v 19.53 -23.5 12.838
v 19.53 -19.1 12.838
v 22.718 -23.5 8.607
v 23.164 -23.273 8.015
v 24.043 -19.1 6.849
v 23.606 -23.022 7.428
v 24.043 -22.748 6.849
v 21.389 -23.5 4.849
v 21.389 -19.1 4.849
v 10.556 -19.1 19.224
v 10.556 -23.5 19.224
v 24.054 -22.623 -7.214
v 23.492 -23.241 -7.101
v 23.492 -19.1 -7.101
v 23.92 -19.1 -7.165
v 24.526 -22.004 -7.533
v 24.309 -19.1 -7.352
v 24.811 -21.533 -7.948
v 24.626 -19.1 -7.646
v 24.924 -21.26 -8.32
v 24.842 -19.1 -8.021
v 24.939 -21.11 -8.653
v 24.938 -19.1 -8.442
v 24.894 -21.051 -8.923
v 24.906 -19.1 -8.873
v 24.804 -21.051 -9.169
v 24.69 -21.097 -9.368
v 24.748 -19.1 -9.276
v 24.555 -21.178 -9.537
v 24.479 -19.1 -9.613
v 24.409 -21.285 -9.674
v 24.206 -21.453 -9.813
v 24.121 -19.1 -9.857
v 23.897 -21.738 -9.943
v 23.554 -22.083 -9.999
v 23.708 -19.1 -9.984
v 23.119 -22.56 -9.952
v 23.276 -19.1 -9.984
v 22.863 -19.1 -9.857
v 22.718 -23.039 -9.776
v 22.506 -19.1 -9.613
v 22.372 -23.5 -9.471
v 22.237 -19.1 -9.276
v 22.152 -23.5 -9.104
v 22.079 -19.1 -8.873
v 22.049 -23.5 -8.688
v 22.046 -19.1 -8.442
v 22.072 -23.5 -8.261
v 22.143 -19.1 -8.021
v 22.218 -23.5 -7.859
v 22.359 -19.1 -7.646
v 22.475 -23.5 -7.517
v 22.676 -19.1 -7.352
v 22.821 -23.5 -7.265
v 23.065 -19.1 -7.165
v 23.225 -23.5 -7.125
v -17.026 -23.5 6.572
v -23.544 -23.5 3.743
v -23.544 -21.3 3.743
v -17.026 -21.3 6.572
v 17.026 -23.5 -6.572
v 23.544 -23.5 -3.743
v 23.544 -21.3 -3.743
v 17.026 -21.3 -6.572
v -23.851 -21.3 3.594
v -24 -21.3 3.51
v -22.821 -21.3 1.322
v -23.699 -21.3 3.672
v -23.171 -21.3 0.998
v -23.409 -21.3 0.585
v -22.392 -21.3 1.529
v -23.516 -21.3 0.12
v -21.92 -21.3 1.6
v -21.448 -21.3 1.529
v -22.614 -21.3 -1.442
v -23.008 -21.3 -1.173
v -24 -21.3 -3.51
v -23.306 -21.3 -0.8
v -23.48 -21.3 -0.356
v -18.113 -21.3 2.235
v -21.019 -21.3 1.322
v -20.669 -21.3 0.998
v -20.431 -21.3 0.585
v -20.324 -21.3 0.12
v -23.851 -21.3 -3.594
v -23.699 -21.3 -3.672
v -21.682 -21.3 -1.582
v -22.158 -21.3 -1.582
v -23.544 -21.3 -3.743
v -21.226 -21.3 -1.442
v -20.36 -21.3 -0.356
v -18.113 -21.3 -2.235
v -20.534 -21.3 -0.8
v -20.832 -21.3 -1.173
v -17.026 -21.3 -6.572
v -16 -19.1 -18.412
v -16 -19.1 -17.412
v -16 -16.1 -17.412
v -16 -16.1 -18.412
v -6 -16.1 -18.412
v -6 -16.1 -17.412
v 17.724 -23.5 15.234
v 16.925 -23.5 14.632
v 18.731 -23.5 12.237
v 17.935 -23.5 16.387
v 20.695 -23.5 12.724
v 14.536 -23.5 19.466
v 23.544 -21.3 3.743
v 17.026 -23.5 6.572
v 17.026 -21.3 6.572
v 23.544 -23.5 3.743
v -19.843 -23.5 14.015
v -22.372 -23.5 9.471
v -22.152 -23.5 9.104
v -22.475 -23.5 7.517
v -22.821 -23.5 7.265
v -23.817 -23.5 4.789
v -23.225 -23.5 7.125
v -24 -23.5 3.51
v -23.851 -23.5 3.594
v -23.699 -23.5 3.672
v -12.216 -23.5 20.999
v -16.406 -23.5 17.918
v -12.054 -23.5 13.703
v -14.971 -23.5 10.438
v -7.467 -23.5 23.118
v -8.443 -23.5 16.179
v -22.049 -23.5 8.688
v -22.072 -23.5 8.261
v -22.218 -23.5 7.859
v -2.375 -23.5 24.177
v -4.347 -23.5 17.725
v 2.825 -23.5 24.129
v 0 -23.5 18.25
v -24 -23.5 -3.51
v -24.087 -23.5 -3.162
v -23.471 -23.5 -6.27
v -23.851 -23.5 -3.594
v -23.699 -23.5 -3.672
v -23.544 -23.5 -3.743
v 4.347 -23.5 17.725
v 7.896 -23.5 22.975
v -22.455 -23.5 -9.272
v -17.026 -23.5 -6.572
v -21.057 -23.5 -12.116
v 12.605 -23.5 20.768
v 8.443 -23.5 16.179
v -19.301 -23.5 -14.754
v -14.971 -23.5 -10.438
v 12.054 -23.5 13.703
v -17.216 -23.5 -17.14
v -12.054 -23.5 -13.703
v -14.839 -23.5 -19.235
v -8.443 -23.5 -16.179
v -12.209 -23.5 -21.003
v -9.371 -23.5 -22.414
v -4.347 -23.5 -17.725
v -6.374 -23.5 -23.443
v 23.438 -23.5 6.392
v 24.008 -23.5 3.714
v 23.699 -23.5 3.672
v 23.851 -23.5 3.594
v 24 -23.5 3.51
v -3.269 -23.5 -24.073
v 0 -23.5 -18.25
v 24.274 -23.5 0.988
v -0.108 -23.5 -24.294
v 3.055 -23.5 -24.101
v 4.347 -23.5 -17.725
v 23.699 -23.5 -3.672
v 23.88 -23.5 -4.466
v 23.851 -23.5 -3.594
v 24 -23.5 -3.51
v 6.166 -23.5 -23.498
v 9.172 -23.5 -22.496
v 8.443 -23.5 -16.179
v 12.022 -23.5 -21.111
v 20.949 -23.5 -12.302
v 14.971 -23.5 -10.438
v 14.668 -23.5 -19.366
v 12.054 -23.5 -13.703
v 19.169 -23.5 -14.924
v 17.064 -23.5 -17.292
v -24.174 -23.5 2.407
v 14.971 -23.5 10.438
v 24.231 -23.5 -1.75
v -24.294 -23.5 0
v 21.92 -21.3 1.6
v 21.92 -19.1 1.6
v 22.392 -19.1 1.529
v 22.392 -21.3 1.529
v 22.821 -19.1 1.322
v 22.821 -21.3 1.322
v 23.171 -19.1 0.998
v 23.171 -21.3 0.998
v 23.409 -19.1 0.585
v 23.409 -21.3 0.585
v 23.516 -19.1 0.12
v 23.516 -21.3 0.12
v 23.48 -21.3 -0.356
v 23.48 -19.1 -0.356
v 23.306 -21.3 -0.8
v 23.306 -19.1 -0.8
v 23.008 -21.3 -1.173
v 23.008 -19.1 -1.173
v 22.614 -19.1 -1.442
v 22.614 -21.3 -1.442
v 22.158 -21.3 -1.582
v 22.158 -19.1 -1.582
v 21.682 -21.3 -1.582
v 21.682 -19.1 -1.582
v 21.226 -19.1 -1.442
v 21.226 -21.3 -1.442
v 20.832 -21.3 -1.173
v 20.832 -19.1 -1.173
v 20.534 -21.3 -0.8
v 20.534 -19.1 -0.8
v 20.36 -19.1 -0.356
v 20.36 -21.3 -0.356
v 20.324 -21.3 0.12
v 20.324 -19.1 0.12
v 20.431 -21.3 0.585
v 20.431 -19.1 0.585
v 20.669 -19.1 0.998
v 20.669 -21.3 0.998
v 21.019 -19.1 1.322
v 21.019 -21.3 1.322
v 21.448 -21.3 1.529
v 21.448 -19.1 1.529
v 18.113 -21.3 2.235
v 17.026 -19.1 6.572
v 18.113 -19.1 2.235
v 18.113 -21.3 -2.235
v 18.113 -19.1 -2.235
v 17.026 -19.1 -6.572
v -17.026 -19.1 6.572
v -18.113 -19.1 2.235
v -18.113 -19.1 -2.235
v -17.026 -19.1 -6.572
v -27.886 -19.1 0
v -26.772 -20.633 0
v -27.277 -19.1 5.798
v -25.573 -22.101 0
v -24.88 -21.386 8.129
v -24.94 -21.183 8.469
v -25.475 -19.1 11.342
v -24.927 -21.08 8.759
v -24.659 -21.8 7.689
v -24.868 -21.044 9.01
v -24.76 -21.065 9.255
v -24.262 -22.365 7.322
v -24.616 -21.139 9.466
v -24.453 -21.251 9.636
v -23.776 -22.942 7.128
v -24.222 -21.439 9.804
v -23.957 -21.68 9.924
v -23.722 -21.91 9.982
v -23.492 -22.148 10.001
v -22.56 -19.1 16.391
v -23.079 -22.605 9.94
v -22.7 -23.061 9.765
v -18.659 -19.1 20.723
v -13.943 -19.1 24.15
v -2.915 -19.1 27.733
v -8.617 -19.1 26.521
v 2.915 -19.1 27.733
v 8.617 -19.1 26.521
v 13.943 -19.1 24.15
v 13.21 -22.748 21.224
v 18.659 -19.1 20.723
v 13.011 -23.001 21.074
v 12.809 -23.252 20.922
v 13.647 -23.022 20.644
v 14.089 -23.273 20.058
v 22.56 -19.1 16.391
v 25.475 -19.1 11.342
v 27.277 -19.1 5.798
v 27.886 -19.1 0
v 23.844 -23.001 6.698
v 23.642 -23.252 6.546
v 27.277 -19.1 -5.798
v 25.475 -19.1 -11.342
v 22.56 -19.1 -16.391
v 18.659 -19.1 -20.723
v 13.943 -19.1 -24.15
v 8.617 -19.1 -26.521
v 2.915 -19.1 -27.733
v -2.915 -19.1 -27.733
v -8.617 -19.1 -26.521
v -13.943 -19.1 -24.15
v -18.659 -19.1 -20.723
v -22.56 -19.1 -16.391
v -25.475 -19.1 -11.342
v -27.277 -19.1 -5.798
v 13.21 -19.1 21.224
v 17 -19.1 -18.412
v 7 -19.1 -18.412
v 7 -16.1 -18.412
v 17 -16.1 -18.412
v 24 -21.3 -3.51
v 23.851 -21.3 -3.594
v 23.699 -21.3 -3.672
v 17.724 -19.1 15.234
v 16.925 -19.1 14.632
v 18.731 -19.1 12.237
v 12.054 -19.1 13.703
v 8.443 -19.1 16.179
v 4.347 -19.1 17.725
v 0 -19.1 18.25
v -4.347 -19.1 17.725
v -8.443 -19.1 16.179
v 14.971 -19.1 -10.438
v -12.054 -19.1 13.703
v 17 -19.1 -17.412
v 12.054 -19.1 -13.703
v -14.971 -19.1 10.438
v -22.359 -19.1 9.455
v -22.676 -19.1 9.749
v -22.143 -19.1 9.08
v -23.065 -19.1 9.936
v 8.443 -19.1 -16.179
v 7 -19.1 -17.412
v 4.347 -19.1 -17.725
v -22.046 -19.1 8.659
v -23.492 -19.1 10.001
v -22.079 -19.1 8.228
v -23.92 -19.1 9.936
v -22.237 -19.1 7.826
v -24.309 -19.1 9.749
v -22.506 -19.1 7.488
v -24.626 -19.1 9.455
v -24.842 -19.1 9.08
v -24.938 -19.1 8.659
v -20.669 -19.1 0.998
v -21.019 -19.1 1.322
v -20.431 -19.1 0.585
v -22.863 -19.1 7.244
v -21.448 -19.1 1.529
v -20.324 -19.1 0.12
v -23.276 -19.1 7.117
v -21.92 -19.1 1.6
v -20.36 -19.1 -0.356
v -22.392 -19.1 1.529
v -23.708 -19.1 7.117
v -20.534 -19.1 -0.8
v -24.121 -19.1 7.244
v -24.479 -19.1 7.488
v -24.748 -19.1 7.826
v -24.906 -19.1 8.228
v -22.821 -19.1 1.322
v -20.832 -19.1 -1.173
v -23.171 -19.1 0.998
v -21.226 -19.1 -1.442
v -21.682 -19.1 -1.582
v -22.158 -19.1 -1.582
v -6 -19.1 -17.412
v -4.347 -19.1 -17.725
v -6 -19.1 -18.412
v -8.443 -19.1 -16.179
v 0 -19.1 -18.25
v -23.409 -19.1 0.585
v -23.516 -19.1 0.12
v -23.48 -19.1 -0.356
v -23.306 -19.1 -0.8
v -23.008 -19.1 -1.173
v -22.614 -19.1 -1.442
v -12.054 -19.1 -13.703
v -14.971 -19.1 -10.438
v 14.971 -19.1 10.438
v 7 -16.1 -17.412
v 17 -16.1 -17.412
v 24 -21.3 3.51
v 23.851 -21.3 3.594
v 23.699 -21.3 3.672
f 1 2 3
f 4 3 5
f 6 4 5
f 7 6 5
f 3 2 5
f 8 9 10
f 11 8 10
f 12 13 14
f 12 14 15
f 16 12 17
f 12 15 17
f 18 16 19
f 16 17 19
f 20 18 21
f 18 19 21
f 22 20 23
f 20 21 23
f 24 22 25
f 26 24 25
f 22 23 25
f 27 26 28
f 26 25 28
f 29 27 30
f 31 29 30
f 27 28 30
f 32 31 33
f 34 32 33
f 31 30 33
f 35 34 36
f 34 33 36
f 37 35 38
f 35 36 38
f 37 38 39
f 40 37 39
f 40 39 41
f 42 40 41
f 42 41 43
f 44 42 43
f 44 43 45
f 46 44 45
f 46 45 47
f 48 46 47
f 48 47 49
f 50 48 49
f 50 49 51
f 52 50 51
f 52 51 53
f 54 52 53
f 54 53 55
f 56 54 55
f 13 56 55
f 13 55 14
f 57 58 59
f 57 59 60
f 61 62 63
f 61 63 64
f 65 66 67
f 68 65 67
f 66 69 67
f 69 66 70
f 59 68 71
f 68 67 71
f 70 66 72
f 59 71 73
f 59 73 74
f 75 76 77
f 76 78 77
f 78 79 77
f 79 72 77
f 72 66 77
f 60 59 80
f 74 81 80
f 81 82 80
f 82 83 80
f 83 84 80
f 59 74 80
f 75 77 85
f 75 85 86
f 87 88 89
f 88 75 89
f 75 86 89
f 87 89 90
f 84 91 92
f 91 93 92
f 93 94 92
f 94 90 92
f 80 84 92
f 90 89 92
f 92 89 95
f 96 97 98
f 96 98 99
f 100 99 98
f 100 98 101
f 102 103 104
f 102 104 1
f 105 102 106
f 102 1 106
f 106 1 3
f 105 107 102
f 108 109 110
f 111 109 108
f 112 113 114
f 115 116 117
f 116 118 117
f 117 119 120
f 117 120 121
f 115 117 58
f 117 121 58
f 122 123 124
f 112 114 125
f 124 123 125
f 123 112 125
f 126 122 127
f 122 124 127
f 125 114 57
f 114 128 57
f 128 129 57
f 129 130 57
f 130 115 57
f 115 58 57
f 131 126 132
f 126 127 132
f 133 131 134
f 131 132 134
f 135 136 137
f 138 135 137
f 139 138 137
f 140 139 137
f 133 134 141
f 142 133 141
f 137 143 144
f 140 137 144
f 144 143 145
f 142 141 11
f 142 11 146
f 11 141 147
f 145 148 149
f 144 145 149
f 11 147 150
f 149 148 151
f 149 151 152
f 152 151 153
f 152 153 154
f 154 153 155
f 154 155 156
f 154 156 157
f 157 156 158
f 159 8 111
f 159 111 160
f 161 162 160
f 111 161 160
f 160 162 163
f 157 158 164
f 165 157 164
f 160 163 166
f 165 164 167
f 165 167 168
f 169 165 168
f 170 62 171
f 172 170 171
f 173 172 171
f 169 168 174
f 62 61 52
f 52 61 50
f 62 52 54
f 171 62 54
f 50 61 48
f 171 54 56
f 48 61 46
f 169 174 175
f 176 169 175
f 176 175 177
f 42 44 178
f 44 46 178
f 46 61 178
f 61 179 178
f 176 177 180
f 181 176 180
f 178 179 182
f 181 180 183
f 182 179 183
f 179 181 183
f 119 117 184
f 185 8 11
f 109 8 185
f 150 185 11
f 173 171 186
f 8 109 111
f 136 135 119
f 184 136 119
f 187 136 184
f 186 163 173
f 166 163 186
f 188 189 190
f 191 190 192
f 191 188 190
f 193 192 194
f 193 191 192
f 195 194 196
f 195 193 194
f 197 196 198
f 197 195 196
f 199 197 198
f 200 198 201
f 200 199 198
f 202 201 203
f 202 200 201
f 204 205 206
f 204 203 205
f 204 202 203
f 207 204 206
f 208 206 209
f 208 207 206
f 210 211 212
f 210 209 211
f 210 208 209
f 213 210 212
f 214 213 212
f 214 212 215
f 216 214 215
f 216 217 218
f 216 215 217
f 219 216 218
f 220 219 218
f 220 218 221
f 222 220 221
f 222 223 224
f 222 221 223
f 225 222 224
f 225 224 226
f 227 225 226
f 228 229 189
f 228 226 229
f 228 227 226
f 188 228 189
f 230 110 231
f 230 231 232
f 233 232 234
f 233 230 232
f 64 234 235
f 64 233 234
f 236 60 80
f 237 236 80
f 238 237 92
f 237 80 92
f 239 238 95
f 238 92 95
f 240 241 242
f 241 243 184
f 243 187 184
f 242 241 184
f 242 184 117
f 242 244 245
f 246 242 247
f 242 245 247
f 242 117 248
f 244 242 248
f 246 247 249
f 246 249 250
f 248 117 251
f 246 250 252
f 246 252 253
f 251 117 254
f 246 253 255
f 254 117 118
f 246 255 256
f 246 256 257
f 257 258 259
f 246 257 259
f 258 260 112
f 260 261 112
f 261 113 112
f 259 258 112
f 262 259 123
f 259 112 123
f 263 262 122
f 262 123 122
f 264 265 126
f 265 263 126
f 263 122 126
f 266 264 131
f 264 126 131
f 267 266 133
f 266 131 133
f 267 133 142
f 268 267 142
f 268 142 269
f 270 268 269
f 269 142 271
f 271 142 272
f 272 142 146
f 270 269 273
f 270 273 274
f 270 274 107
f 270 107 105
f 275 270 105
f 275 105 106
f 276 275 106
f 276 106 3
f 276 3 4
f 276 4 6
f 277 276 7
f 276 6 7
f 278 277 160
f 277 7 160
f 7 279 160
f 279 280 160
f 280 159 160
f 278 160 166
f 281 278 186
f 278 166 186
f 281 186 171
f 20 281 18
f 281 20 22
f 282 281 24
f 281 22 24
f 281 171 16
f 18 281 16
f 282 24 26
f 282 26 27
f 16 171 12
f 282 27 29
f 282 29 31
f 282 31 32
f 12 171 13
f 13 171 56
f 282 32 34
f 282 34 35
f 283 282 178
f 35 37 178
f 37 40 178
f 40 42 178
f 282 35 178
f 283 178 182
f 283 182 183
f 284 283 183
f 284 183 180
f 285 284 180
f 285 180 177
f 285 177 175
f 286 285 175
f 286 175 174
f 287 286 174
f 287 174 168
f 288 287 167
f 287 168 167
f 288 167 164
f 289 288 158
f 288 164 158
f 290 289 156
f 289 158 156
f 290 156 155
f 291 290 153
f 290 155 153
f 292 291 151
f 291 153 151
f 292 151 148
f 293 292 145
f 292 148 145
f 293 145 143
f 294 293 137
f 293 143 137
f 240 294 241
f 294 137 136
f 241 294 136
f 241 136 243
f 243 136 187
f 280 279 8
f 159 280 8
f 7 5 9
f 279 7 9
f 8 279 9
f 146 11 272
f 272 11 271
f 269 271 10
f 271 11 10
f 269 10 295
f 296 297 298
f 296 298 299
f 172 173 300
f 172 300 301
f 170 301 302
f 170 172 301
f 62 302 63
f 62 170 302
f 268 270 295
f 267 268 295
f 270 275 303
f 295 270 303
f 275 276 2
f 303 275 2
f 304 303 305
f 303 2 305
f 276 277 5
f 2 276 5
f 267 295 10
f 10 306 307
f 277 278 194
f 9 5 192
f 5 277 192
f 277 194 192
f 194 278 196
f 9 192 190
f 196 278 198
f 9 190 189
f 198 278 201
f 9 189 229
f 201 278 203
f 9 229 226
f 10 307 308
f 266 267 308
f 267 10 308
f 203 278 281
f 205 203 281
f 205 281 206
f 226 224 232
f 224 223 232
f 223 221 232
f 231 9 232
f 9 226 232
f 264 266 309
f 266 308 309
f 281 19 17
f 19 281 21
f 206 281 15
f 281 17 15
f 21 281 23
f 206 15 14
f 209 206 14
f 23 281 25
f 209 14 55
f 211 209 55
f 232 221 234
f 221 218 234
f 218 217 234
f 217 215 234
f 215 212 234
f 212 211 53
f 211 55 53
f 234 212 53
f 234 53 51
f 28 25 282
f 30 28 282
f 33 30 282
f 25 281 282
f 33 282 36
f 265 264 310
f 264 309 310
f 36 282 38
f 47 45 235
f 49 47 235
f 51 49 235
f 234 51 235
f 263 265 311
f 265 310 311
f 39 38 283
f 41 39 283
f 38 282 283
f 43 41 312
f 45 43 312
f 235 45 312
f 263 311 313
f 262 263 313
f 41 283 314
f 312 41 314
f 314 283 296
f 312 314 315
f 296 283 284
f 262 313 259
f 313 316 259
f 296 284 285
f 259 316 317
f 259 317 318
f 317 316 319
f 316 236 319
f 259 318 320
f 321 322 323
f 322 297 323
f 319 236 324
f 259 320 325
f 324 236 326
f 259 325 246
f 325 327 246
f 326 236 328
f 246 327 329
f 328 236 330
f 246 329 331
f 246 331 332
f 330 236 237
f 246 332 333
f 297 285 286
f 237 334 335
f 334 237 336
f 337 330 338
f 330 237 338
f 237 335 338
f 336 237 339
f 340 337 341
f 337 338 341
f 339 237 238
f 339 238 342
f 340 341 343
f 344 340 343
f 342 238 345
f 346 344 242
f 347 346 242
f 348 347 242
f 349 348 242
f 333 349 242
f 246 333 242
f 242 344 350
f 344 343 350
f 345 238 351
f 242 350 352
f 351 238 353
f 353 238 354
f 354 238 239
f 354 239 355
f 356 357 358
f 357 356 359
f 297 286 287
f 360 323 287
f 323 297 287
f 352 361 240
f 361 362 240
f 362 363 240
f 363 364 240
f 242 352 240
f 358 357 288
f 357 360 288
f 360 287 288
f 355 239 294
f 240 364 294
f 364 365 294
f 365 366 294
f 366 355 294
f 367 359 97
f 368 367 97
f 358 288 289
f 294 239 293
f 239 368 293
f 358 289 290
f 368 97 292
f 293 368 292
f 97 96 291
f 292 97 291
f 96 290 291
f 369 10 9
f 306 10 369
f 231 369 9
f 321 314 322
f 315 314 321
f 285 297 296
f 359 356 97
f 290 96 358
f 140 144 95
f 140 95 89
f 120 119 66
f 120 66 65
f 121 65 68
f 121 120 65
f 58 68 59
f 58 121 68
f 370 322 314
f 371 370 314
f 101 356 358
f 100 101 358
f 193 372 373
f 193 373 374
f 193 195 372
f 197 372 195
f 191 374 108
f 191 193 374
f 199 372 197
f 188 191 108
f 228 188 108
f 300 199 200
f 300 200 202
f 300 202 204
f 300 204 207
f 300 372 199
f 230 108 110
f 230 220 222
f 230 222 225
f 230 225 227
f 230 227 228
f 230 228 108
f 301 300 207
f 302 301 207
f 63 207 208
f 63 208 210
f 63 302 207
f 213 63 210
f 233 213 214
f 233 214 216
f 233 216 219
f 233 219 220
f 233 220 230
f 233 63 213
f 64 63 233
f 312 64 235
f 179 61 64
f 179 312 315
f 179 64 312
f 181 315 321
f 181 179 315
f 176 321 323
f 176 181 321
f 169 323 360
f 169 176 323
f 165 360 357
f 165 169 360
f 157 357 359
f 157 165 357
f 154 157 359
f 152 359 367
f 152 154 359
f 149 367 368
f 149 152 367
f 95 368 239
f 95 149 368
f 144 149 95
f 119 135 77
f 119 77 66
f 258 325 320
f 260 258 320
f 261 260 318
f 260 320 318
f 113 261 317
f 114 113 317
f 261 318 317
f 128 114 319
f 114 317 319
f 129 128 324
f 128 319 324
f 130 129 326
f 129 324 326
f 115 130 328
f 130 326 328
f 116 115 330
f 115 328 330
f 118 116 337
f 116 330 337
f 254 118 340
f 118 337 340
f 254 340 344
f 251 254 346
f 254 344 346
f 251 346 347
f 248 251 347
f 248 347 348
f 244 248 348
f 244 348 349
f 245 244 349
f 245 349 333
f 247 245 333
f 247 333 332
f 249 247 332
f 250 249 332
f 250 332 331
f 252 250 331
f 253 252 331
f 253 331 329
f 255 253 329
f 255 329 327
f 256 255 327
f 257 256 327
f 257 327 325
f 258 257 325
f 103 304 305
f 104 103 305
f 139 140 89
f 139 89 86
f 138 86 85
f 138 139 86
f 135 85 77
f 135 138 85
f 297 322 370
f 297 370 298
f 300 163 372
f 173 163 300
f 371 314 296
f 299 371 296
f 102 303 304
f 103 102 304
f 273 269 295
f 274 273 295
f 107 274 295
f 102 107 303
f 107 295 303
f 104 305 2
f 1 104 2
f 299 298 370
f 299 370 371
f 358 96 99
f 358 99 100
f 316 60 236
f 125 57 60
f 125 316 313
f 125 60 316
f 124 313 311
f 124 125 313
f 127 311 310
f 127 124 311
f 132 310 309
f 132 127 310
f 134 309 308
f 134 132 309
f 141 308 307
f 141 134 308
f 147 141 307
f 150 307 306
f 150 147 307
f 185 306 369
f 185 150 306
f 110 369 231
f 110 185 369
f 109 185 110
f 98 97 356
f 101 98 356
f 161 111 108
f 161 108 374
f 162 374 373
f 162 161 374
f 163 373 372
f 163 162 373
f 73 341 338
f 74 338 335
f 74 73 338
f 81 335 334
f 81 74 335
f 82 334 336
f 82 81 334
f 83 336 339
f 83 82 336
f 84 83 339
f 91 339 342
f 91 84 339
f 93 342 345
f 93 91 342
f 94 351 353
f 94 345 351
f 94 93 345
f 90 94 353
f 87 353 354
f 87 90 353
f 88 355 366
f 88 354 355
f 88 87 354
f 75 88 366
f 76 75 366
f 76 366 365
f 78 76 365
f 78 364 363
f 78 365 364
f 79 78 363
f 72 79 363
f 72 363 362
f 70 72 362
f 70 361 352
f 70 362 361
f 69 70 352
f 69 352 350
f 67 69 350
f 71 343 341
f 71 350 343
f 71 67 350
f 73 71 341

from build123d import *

# Parameters (mm, degrees)
SKETCH2_R                = 33.8
CUT_EXTRUDE1_DEPTH       = 19.1
CUT_EXTRUDE2_START       = -33.8
CUT_EXTRUDE2_DEPTH       = 14.7
BOSS_EXTRUDE2_START      = -2.2
BOSS_EXTRUDE2_DEPTH      = 2.2
CUT_EXTRUDE3_REACH       = 42.08
SKETCH6_R                = 1.6
SKETCH19_R               = 9
CUT_EXTRUDE10_DEPTH      = 1.4
CUT_EXTRUDE11_REACH      = 42.429
CUT_EXTRUDE11_END_RADIUS = 33.8
SKETCH20_R               = 3.5
CUT_EXTRUDE9_REACH       = 44.024
CUT_EXTRUDE9_END_RADIUS  = 33.8
CUT_EXTRUDE7_REACH       = 44.024
CUT_EXTRUDE7_END_RADIUS  = 33.8
SKETCH10_R               = 1.45
SKETCH14_W               = 10
SKETCH14_H               = 1
BOSS_EXTRUDE1_DEPTH      = 3
CUT_EXTRUDE12_START      = -10.118299
SKETCH21_R               = 27.886018002
CUT_EXTRUDE12_DEPTH      = 10.118299


with BuildPart() as part:
    # Sketch1 → Revolve1 (revolve)
    with BuildSketch(Plane.XY, mode=Mode.PRIVATE) as revolve1_sk:
        with BuildLine():
            Line((0, -33.8), (0, 0))
            Line((0, 0), (33.8, 0))
            ThreePointArc((33.8, 0), (23.900209204, -23.900209204), (0, -33.8))
        make_face()
    revolve(revolve1_sk.sketch.rotate(Axis((0, -33.8, 0), (0, 1, 0)), 180), axis=Axis((0, -33.8, 0), (0, 1, 0)))

    # Sketch2 → Cut-Extrude1 (cut)
    with BuildSketch(Plane(origin=(0, 0, 0), x_dir=(1, 0, 0), z_dir=(0, 1, 0))):
        Circle(SKETCH2_R)
    extrude(amount=-CUT_EXTRUDE1_DEPTH, mode=Mode.SUBTRACT)

    # Sketch5 → Cut-Extrude2 (cut)
    with BuildSketch(Plane(origin=(0, 0, 0), x_dir=(1, 0, 0), z_dir=(0, 1, 0)).offset(CUT_EXTRUDE2_START)):
        with BuildLine():
            Line((-17.025732229, 6.571677263), (-23.544283672, 3.742739979))
            ThreePointArc((-23.544283672, 3.742739979), (-23.775794442, 3.633514413), (-24, 3.509985755))
            Line((-24, 3.509985755), (-24, -3.509985755))
            ThreePointArc((-24, -3.509985755), (-23.775794442, -3.633514413), (-23.544283672, -3.742739979))
            Line((-23.544283672, -3.742739979), (-17.025732229, -6.571677263))
            ThreePointArc((-17.025732229, -6.571677263), (0, -18.25), (17.025732229, -6.571677263))
            Line((17.025732229, -6.571677263), (23.544283672, -3.742739979))
            ThreePointArc((23.544283672, -3.742739979), (23.775794442, -3.633514413), (24, -3.509985755))
            Line((24, -3.509985755), (24, 3.509985755))
            ThreePointArc((24, 3.509985755), (23.775794442, 3.633514413), (23.544283672, 3.742739979))
            Line((23.544283672, 3.742739979), (17.025732229, 6.571677263))
            ThreePointArc((17.025732229, 6.571677263), (0, 18.25), (-17.025732229, 6.571677263))
        make_face()
    extrude(amount=CUT_EXTRUDE2_DEPTH, mode=Mode.SUBTRACT)

    # Sketch16 → Boss-Extrude2 (add)
    with BuildSketch(Plane(origin=(0, -19.1, 0), x_dir=(1, 0, 0), z_dir=(0, 1, 0)).offset(BOSS_EXTRUDE2_START)):
        with BuildLine():
            Line((17.025732229, 6.571677263), (23.544283672, 3.742739979))
            ThreePointArc((23.544283672, 3.742739979), (23.775794442, 3.633514413), (24, 3.509985755))
            Line((24, 3.509985755), (24, -3.509985755))
            ThreePointArc((24, -3.509985755), (23.775794442, -3.633514413), (23.544283672, -3.742739979))
            Line((23.544283672, -3.742739979), (17.025732229, -6.571677263))
            ThreePointArc((17.025732229, -6.571677263), (18.25, 0), (17.025732229, 6.571677263))
        make_face()
        with BuildLine():
            Line((-23.544283672, -3.742739979), (-17.025732229, -6.571677263))
            ThreePointArc((-17.025732229, -6.571677263), (-18.25, 0), (-17.025732229, 6.571677263))
            Line((-17.025732229, 6.571677263), (-23.544283672, 3.742739979))
            ThreePointArc((-23.544283672, 3.742739979), (-23.775794442, 3.633514413), (-24, 3.509985755))
            Line((-24, 3.509985755), (-24, -3.509985755))
            ThreePointArc((-24, -3.509985755), (-23.775794442, -3.633514413), (-23.544283672, -3.742739979))
        make_face()
    extrude(amount=BOSS_EXTRUDE2_DEPTH)

    # Sketch6 → Cut-Extrude3 (cut, up to next)
    with BuildSketch(Plane(origin=(0, -21.3, 0), x_dir=(1, 0, 0), z_dir=(0, 1, 0)), mode=Mode.PRIVATE) as cut_extrude3_sk1:
        with Locations(Location((-21.92, 0, 0), (0, 0, 270))):
            Circle(SKETCH6_R)
    cut_extrude3_tool1 = extrude(cut_extrude3_sk1.sketch, amount=CUT_EXTRUDE3_REACH, mode=Mode.PRIVATE) & part.part
    # Sketch6 → Cut-Extrude3 (cut, up to next)
    with BuildSketch(Plane(origin=(0, -21.3, 0), x_dir=(1, 0, 0), z_dir=(0, 1, 0)), mode=Mode.PRIVATE) as cut_extrude3_sk2:
        with Locations(Location((21.92, 0, 0), (0, 0, 270))):
            Circle(SKETCH6_R)
    cut_extrude3_tool2 = extrude(cut_extrude3_sk2.sketch, amount=CUT_EXTRUDE3_REACH, mode=Mode.PRIVATE) & part.part
    add(cut_extrude3_tool1.solids().sort_by_distance((-21.92, -21.3, 0))[0], mode=Mode.SUBTRACT)
    add(cut_extrude3_tool2.solids().sort_by_distance((21.92, -21.3, 0))[0], mode=Mode.SUBTRACT)

    # Revolve2: read off the stored shape, not the designer's step
    # Revolve2 outline → Revolve2 (revolve)
    with BuildSketch(Plane.XY):
        with BuildLine():
            Line((0, -23.5), (0, -33.8))
            ThreePointArc((0, -33.8), (13.168073663, -31.129436808), (24.255308697, -23.53975361))
            Line((24.255308697, -23.53975361), (24.255308697, -23.5))
            Line((24.255308697, -23.5), (0, -23.5))
        make_face()
    revolve(axis=Axis((0, 0, 0), (0, 1, 0)))

    # Sketch19 → Cut-Extrude10 (cut)
    with BuildSketch(Plane(origin=(0, -23.5, 0), x_dir=(1, 0, 0), z_dir=(0, 1, 0))):
        with Locations(Location((0, 0, 0), (0, 0, 180))):
            Circle(SKETCH19_R)
    extrude(amount=-CUT_EXTRUDE10_DEPTH, mode=Mode.SUBTRACT)

    # Cut-Extrude11: up to this sphere (the profile starts inside it)
    cut_extrude11_end = Location((0, 0, 0)) * Sphere(CUT_EXTRUDE11_END_RADIUS, mode=Mode.PRIVATE)
    # Sketch20 → Cut-Extrude11 (cut, up to the surface)
    with BuildSketch(Plane(origin=(0, -24.9, 0), x_dir=(1, 0, 0), z_dir=(0, 1, 0)), mode=Mode.PRIVATE) as cut_extrude11_sk1:
        with Locations(Location((0, 0, 0), (0, 0, 180))):
            Circle(SKETCH20_R)
    cut_extrude11_tool1 = extrude(cut_extrude11_sk1.sketch, amount=-CUT_EXTRUDE11_REACH, mode=Mode.PRIVATE) & cut_extrude11_end
    add(cut_extrude11_tool1.solids().sort_by_distance((0, -24.9, 0))[0], mode=Mode.SUBTRACT)

    # Cut-Extrude9: up to this sphere (the profile starts inside it)
    cut_extrude9_end = Location((0, 0, 0)) * Sphere(CUT_EXTRUDE9_END_RADIUS, mode=Mode.PRIVATE)
    # Sketch13 → Cut-Extrude9 (cut, up to the surface)
    with BuildSketch(Plane(origin=(0, -19.1, 0), x_dir=(1, 0, 0), z_dir=(0, 1, 0)), mode=Mode.PRIVATE) as cut_extrude9_sk1:
        Polygon((10.556374993, -19.224020053), (13.210464636, -21.224020053), (17.724077309, -15.234253728), (16.925441799, -14.632438705), (18.730886869, -12.236532175), (19.529522379, -12.838347198), (24.043135053, -6.848580873), (21.389045409, -4.848580873), align=None)
    cut_extrude9_tool1 = extrude(cut_extrude9_sk1.sketch, amount=-CUT_EXTRUDE9_REACH, mode=Mode.PRIVATE) & cut_extrude9_end
    add(cut_extrude9_tool1.solids().sort_by_distance((17.250772, -19.1, 12.999389))[0], mode=Mode.SUBTRACT)

    # Cut-Extrude7: up to this sphere (the profile starts inside it)
    cut_extrude7_end = Location((0, 0, 0)) * Sphere(CUT_EXTRUDE7_END_RADIUS, mode=Mode.PRIVATE)
    # Sketch10 → Cut-Extrude7 (cut, up to the surface)
    with BuildSketch(Plane(origin=(0, -19.1, 0), x_dir=(1, 0, 0), z_dir=(0, 1, 0)), mode=Mode.PRIVATE) as cut_extrude7_sk1:
        with Locations(Location((-23.49231552, -8.550503583, 0), (0, 0, 270))):
            Circle(SKETCH10_R)
    cut_extrude7_tool1 = extrude(cut_extrude7_sk1.sketch, amount=-CUT_EXTRUDE7_REACH, mode=Mode.PRIVATE) & cut_extrude7_end
    add(cut_extrude7_tool1.solids().sort_by_distance((-23.492316, -19.1, 8.550504))[0], mode=Mode.SUBTRACT)
    # Sketch10 → Cut-Extrude7 (cut, up to the surface)
    with BuildSketch(Plane(origin=(0, -19.1, 0), x_dir=(1, 0, 0), z_dir=(0, 1, 0)), mode=Mode.PRIVATE) as cut_extrude7_sk2:
        with Locations(Location((23.49231552, 8.550503583, 0), (0, 0, 270))):
            Circle(SKETCH10_R)
    cut_extrude7_tool2 = extrude(cut_extrude7_sk2.sketch, amount=-CUT_EXTRUDE7_REACH, mode=Mode.PRIVATE) & cut_extrude7_end
    add(cut_extrude7_tool2.solids().sort_by_distance((23.492316, -19.1, -8.550504))[0], mode=Mode.SUBTRACT)

    # Sketch14 → Boss-Extrude1 (add)
    with BuildSketch(Plane(origin=(0, -19.1, 0), x_dir=(1, 0, 0), z_dir=(0, 1, 0))):
        with Locations((12, 17.911516357)):
            Rectangle(SKETCH14_W, SKETCH14_H)
        with Locations((-11, 17.911516357)):
            Rectangle(SKETCH14_W, SKETCH14_H)
    extrude(amount=BOSS_EXTRUDE1_DEPTH)

    # Sketch21 → Cut-Extrude12 (cut)
    with BuildSketch(Plane(origin=(0, -23.5, 0), x_dir=(1, 0, 0), z_dir=(0, 1, 0)).offset(CUT_EXTRUDE12_START)):
        Circle(SKETCH21_R)
    extrude(amount=CUT_EXTRUDE12_DEPTH, mode=Mode.SUBTRACT)


solid = part.part
